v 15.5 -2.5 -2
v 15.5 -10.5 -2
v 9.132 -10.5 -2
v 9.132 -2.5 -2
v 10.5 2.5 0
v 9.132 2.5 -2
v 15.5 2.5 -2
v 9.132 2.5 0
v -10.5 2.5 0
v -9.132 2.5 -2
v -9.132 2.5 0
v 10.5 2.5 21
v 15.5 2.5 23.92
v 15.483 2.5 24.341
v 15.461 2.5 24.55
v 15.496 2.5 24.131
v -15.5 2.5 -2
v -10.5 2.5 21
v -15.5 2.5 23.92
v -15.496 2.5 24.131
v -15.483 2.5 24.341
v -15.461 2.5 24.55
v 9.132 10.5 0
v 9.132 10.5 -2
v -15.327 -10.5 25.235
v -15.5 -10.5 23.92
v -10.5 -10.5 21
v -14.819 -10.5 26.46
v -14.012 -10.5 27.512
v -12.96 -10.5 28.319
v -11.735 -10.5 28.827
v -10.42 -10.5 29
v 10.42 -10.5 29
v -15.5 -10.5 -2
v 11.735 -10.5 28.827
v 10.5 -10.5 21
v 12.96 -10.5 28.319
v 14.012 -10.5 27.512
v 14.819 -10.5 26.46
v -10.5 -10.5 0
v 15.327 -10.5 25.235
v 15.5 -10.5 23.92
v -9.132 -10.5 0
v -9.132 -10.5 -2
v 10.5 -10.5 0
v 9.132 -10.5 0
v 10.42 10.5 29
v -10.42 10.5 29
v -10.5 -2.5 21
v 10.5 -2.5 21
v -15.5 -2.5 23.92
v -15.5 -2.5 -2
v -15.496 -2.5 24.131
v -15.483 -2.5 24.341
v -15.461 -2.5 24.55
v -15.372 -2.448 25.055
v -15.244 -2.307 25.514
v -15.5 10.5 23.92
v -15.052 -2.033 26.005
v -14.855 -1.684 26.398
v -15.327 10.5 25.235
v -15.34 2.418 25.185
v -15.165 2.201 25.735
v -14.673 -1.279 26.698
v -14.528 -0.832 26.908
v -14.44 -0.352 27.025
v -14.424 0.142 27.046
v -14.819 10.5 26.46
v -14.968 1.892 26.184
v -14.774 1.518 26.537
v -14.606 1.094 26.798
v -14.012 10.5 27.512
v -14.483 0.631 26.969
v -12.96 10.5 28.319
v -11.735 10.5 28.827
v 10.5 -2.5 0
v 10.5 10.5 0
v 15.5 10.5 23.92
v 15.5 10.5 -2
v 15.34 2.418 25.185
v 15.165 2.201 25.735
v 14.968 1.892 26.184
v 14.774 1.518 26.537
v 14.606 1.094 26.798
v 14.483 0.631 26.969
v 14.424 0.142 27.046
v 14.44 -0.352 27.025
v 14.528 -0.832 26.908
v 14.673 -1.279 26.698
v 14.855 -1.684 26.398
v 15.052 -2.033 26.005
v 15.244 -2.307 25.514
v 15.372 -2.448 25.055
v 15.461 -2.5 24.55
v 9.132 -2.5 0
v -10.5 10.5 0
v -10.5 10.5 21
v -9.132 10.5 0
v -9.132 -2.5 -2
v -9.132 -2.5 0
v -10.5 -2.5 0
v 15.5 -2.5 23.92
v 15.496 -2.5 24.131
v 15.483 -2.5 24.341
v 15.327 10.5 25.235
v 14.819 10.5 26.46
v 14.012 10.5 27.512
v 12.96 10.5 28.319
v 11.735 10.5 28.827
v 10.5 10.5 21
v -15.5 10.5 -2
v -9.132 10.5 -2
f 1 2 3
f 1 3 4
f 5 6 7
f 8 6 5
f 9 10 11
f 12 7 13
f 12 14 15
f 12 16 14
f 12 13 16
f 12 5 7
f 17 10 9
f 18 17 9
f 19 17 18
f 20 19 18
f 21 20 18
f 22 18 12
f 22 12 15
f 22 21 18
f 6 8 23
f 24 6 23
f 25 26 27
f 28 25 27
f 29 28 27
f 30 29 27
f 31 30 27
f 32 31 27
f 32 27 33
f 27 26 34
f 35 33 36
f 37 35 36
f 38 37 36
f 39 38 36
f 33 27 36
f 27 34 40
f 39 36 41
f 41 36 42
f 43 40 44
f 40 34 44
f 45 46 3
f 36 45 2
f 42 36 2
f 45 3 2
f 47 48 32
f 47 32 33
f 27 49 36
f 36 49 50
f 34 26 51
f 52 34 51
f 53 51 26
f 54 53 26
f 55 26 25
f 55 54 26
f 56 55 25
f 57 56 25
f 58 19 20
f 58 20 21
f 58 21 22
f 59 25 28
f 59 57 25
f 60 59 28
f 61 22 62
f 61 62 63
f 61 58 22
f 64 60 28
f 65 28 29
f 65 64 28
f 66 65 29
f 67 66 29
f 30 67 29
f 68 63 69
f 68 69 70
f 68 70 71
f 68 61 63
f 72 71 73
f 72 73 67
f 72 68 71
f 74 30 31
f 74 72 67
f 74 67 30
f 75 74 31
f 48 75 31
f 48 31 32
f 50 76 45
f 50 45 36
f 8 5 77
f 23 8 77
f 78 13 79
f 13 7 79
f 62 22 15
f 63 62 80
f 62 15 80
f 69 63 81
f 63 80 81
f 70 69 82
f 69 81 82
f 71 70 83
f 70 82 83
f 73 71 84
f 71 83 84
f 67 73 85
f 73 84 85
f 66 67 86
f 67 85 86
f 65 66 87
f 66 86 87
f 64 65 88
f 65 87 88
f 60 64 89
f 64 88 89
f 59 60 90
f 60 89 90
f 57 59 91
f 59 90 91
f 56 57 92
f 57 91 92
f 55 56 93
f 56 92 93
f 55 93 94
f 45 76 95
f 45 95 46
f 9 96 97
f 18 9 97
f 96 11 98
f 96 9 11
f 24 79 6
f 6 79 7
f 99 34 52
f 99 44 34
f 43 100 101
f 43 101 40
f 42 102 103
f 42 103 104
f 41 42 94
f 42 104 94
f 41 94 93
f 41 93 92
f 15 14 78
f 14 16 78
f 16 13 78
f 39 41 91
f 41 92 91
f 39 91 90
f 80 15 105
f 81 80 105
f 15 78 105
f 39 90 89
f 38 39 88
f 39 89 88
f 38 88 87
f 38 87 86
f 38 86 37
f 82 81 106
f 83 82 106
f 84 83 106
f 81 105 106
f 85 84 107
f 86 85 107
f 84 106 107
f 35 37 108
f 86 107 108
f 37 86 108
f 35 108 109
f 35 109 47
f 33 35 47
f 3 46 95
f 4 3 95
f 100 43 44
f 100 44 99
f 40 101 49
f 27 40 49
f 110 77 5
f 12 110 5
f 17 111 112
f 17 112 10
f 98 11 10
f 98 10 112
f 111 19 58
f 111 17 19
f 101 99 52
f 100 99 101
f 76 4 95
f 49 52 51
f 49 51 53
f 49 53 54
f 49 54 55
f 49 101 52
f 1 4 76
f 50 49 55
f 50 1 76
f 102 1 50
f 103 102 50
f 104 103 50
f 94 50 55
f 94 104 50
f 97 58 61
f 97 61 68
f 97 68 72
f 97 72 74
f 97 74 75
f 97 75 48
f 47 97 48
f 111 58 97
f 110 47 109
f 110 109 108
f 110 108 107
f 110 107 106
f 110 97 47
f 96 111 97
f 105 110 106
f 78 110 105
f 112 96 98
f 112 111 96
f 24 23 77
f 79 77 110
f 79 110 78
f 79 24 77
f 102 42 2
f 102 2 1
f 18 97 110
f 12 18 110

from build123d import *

# Parameters (mm, degrees)
F0_W         = 31
F0_H         = 21
F1_DEPTH     = 28
F2_W         = 21
F2_H         = 42
F3_DEPTH     = 50.8
F4_DEPTH     = 25.4
F6_DEPTH     = 25.4
F7_DEPTH     = 25.4
F8_DEPTH     = 2
F9_W         = 10.5
F9_H         = 2
F10_DEPTH    = 10.5
F11_DEPTH    = 10.5
F12_W        = 18.7637824565
F12_H        = 49.8975180089
F13_DEPTH    = 25.4
F14_DEPTH    = 25.4
F15_DEPTH    = 0.25
F16_DEPTH    = 0.25
F17_DEPTH    = 1
F18_T1_DEPTH = 46.4


# Not quite as in the source:
# - a fillet or chamfer that OpenCascade refuses, or shapes differently, is made with other operations: its cross-section is extruded or revolved along the edge and cut away or added


with BuildPart() as f1:
    # F0 (on Top) → F1 (new body)
    with BuildSketch(Plane.XY):
        Rectangle(F0_W, F0_H)
    extrude(amount=F1_DEPTH)

    # F2 (on Front) → F3 (cut)
    with BuildSketch(Plane.XZ):
        Rectangle(F2_W, F2_H)
    extrude(amount=-F3_DEPTH, mode=Mode.SUBTRACT)

    # F2 (on Front) → F4 (cut)
    with BuildSketch(Plane.XZ):
        Rectangle(F2_W, F2_H)
    extrude(amount=F4_DEPTH, mode=Mode.SUBTRACT)

    # F5 (on Right) → F6 (cut)
    with BuildSketch(Plane.YZ):
        with BuildLine():
            Line((0, 24.5501343161), (2.5, 24.5501343161))
            ThreePointArc((2.5, 24.5501343161), (0, 27.0501343161), (-2.5, 24.5501343161))
            Line((-2.5, 24.5501343161), (0, 24.5501343161))
        make_face()
        with BuildLine():
            Line((2.5, -28.5555105656), (2.5, 24.5501343161))
            ThreePointArc((2.5, 24.5501343161), (1.767766953, 22.7823673631), (0, 22.0501343161))
            Line((0, 22.0501343161), (0, -28.5555105656))
            Line((0, -28.5555105656), (2.5, -28.5555105656))
        make_face()
        with BuildLine():
            ThreePointArc((0, 22.0501343161), (1.767766953, 22.7823673631), (2.5, 24.5501343161))
            Line((2.5, 24.5501343161), (0, 24.5501343161))
            Line((0, 24.5501343161), (0, 22.0501343161))
        make_face()
        with BuildLine():
            Line((0, 24.5501343161), (-2.5, 24.5501343161))
            ThreePointArc((-2.5, 24.5501343161), (-1.767766953, 22.7823673631), (0, 22.0501343161))
            Line((0, 22.0501343161), (0, 24.5501343161))
        make_face()
        with BuildLine():
            ThreePointArc((0, 22.0501343161), (-1.767766953, 22.7823673631), (-2.5, 24.5501343161))
            Line((-2.5, 24.5501343161), (-2.5, -33.7370373309))
            Line((-2.5, -33.7370373309), (0, -33.7370373309))
            Line((0, -33.7370373309), (0, -28.5555105656))
            Line((0, -28.5555105656), (0, 22.0501343161))
        make_face()
    extrude(amount=-F6_DEPTH, mode=Mode.SUBTRACT)

    # F5 (on Right) → F7 (cut)
    with BuildSketch(Plane.YZ):
        with BuildLine():
            Line((0, 24.5501343161), (2.5, 24.5501343161))
            ThreePointArc((2.5, 24.5501343161), (0, 27.0501343161), (-2.5, 24.5501343161))
            Line((-2.5, 24.5501343161), (0, 24.5501343161))
        make_face()
        with BuildLine():
            Line((2.5, -28.5555105656), (2.5, 24.5501343161))
            ThreePointArc((2.5, 24.5501343161), (1.767766953, 22.7823673631), (0, 22.0501343161))
            Line((0, 22.0501343161), (0, -28.5555105656))
            Line((0, -28.5555105656), (2.5, -28.5555105656))
        make_face()
        with BuildLine():
            ThreePointArc((0, 22.0501343161), (1.767766953, 22.7823673631), (2.5, 24.5501343161))
            Line((2.5, 24.5501343161), (0, 24.5501343161))
            Line((0, 24.5501343161), (0, 22.0501343161))
        make_face()
        with BuildLine():
            Line((0, 24.5501343161), (-2.5, 24.5501343161))
            ThreePointArc((-2.5, 24.5501343161), (-1.767766953, 22.7823673631), (0, 22.0501343161))
            Line((0, 22.0501343161), (0, 24.5501343161))
        make_face()
        with BuildLine():
            ThreePointArc((0, 22.0501343161), (-1.767766953, 22.7823673631), (-2.5, 24.5501343161))
            Line((-2.5, 24.5501343161), (-2.5, -33.7370373309))
            Line((-2.5, -33.7370373309), (0, -33.7370373309))
            Line((0, -33.7370373309), (0, -28.5555105656))
            Line((0, -28.5555105656), (0, 22.0501343161))
        make_face()
    extrude(amount=F7_DEPTH, mode=Mode.SUBTRACT)

    # F8 (add): faces of the model
    f8_faces = [f1.faces().sort_by_distance(p)[0] for p in [
        (13, 6.5, 0),
        (13, -6.5, 0),
        (-13, -6.5, 0),
        (-13, 6.5, 0),
    ]]
    extrude(f8_faces, amount=F8_DEPTH)

    # F9 (on Right) → F10 (join)
    with BuildSketch(Plane.YZ):
        with Locations((-5.25, -1)):
            Rectangle(F9_W, F9_H)
        with Locations((5.25, -1)):
            Rectangle(F9_W, F9_H)
    extrude(amount=F10_DEPTH)

    # F11 (add): a face of the model
    f11_faces = [f1.faces().sort_by_distance(p)[0] for p in [
        (0, 0, -1),
    ]]
    extrude(f11_faces, amount=F11_DEPTH)

    # F12 (on Top) → F13 (cut)
    with BuildSketch(Plane.XY):
        Rectangle(F12_W, F12_H)
    extrude(amount=-F13_DEPTH, mode=Mode.SUBTRACT)

    # F14 (cut): a face of the model
    f14_faces = [f1.faces().sort_by_distance(p)[0] for p in [
        (10.5, 0, -1),
    ]]
    extrude(f14_faces, amount=-F14_DEPTH, mode=Mode.SUBTRACT)

    # F15 (add): faces of the model
    f15_faces = [f1.faces().sort_by_distance(p)[0] for p in [
        (9.3818912283, 6.5, -1),
        (9.3818912283, -6.5, -1),
    ]]
    extrude(f15_faces, amount=F15_DEPTH)

    # F16 (add): faces of the model
    f16_faces = [f1.faces().sort_by_distance(p)[0] for p in [
        (-9.3818912283, 6.5, -1),
        (-9.3818912283, -6.5, -1),
    ]]
    extrude(f16_faces, amount=F16_DEPTH)

    # F17 (add): a face of the model
    f17_faces = [f1.faces().sort_by_distance(p)[0] for p in [
        (0, 0, 28),
    ]]
    extrude(f17_faces, amount=F17_DEPTH)

    # F18: fillet of radius 5.08 on 2 edges, made by hand

    # F18_s2 → F18_t1 (cut)
    with BuildSketch(Plane.XZ.offset(-23.2)):
        with BuildLine():
            ThreePointArc((-15.5, 23.92), (-14.0121024484, 27.5121024484), (-10.42, 29))
            Line((-10.42, 29), (-15.5, 29))
            Line((-15.5, 29), (-15.5, 23.92))
        make_face()
        with BuildLine():
            ThreePointArc((15.5, 23.92), (14.0121024484, 27.5121024484), (10.42, 29))
            Line((10.42, 29), (15.5, 29))
            Line((15.5, 29), (15.5, 23.92))
        make_face()
    extrude(amount=F18_T1_DEPTH, mode=Mode.SUBTRACT)


solid = f1.part
